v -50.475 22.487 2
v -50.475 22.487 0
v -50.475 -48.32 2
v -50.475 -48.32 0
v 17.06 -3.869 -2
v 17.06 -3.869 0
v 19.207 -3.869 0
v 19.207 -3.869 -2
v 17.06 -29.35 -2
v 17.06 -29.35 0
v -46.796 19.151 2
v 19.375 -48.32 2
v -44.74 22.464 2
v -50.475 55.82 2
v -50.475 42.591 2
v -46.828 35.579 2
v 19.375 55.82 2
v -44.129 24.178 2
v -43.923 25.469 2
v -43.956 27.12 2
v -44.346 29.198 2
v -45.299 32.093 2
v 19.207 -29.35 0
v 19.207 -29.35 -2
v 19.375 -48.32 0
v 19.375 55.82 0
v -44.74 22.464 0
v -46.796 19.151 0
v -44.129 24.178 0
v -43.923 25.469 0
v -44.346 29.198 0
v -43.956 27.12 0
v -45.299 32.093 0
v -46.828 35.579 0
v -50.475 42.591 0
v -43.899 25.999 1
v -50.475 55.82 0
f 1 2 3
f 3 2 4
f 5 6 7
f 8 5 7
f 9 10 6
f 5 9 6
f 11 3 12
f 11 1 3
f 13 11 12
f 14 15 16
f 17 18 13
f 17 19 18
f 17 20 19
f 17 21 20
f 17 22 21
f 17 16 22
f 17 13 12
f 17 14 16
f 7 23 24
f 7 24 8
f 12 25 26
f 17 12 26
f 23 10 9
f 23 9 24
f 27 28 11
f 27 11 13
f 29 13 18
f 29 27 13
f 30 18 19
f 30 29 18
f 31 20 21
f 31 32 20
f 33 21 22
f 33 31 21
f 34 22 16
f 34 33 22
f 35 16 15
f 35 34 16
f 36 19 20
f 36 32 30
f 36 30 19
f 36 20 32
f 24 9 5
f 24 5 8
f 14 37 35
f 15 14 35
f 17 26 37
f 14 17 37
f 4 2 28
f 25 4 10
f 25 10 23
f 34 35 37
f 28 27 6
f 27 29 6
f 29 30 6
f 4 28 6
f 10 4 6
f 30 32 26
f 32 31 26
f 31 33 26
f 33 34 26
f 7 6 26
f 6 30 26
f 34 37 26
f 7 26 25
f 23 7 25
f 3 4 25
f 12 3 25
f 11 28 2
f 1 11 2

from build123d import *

# Parameters (mm, degrees)
F1_DEPTH = 2
F2_W     = 2.1478533745
F2_H     = 25.4813507199
F3_DEPTH = 2


with BuildPart() as f1:
    # F0 (on Top) → F1 (new body)
    with BuildSketch(Plane.XY):
        with BuildLine():
            Line((-50.4745617509, 15.1801089048), (-50.4745617509, -3.8698910952))
            Line((-50.4745617509, -3.8698910952), (-50.4745617509, -29.2698910952))
            Line((-50.4745617509, -29.2698910952), (-50.4745617509, -48.3198910952))
            Line((-50.4745617509, -48.3198910952), (-28.2495617509, -48.3198910952))
            Line((-28.2495617509, -48.3198910952), (-2.8495617509, -48.3198910952))
            Line((-2.8495617509, -48.3198910952), (19.3754382491, -48.3198910952))
            Line((19.3754382491, -48.3198910952), (19.3754382491, -29.2698910952))
            Line((19.3754382491, -29.2698910952), (19.3754382491, -3.8698910952))
            Line((19.3754382491, -3.8698910952), (19.3754382491, 15.1801089048))
            Line((19.3754382491, 15.1801089048), (19.3754382491, 55.8201089048))
            Line((19.3754382491, 55.8201089048), (-50.4745617509, 55.8201089048))
            Line((-50.4745617509, 55.8201089048), (-50.4745617509, 42.5905920565))
            add(Edge.make_bspline(
                [(-46.7963367701, 19.1511064768), (-45.3638130005, 21.1811384078), (-41.711839481, 26.3563570482), (-47.1621757409, 36.4539075513), (-50.4745617509, 42.5905920565)],
                knots=[0, 0, 0, 0, 0.3922601785, 1, 1, 1, 1], degree=3))
            Line((-46.7963367701, 19.1511064768), (-50.4745617509, 22.4870592356))
            Line((-50.4745617509, 22.4870592356), (-50.4745617509, 15.1801089048))
        make_face()
    extrude(amount=F1_DEPTH)

    # F2 (on Top) → F3 (join)
    with BuildSketch(Plane.XY):
        with Locations((18.1335583329, -16.6092142463)):
            Rectangle(F2_W, F2_H)
    extrude(amount=-F3_DEPTH)


solid = f1.part
